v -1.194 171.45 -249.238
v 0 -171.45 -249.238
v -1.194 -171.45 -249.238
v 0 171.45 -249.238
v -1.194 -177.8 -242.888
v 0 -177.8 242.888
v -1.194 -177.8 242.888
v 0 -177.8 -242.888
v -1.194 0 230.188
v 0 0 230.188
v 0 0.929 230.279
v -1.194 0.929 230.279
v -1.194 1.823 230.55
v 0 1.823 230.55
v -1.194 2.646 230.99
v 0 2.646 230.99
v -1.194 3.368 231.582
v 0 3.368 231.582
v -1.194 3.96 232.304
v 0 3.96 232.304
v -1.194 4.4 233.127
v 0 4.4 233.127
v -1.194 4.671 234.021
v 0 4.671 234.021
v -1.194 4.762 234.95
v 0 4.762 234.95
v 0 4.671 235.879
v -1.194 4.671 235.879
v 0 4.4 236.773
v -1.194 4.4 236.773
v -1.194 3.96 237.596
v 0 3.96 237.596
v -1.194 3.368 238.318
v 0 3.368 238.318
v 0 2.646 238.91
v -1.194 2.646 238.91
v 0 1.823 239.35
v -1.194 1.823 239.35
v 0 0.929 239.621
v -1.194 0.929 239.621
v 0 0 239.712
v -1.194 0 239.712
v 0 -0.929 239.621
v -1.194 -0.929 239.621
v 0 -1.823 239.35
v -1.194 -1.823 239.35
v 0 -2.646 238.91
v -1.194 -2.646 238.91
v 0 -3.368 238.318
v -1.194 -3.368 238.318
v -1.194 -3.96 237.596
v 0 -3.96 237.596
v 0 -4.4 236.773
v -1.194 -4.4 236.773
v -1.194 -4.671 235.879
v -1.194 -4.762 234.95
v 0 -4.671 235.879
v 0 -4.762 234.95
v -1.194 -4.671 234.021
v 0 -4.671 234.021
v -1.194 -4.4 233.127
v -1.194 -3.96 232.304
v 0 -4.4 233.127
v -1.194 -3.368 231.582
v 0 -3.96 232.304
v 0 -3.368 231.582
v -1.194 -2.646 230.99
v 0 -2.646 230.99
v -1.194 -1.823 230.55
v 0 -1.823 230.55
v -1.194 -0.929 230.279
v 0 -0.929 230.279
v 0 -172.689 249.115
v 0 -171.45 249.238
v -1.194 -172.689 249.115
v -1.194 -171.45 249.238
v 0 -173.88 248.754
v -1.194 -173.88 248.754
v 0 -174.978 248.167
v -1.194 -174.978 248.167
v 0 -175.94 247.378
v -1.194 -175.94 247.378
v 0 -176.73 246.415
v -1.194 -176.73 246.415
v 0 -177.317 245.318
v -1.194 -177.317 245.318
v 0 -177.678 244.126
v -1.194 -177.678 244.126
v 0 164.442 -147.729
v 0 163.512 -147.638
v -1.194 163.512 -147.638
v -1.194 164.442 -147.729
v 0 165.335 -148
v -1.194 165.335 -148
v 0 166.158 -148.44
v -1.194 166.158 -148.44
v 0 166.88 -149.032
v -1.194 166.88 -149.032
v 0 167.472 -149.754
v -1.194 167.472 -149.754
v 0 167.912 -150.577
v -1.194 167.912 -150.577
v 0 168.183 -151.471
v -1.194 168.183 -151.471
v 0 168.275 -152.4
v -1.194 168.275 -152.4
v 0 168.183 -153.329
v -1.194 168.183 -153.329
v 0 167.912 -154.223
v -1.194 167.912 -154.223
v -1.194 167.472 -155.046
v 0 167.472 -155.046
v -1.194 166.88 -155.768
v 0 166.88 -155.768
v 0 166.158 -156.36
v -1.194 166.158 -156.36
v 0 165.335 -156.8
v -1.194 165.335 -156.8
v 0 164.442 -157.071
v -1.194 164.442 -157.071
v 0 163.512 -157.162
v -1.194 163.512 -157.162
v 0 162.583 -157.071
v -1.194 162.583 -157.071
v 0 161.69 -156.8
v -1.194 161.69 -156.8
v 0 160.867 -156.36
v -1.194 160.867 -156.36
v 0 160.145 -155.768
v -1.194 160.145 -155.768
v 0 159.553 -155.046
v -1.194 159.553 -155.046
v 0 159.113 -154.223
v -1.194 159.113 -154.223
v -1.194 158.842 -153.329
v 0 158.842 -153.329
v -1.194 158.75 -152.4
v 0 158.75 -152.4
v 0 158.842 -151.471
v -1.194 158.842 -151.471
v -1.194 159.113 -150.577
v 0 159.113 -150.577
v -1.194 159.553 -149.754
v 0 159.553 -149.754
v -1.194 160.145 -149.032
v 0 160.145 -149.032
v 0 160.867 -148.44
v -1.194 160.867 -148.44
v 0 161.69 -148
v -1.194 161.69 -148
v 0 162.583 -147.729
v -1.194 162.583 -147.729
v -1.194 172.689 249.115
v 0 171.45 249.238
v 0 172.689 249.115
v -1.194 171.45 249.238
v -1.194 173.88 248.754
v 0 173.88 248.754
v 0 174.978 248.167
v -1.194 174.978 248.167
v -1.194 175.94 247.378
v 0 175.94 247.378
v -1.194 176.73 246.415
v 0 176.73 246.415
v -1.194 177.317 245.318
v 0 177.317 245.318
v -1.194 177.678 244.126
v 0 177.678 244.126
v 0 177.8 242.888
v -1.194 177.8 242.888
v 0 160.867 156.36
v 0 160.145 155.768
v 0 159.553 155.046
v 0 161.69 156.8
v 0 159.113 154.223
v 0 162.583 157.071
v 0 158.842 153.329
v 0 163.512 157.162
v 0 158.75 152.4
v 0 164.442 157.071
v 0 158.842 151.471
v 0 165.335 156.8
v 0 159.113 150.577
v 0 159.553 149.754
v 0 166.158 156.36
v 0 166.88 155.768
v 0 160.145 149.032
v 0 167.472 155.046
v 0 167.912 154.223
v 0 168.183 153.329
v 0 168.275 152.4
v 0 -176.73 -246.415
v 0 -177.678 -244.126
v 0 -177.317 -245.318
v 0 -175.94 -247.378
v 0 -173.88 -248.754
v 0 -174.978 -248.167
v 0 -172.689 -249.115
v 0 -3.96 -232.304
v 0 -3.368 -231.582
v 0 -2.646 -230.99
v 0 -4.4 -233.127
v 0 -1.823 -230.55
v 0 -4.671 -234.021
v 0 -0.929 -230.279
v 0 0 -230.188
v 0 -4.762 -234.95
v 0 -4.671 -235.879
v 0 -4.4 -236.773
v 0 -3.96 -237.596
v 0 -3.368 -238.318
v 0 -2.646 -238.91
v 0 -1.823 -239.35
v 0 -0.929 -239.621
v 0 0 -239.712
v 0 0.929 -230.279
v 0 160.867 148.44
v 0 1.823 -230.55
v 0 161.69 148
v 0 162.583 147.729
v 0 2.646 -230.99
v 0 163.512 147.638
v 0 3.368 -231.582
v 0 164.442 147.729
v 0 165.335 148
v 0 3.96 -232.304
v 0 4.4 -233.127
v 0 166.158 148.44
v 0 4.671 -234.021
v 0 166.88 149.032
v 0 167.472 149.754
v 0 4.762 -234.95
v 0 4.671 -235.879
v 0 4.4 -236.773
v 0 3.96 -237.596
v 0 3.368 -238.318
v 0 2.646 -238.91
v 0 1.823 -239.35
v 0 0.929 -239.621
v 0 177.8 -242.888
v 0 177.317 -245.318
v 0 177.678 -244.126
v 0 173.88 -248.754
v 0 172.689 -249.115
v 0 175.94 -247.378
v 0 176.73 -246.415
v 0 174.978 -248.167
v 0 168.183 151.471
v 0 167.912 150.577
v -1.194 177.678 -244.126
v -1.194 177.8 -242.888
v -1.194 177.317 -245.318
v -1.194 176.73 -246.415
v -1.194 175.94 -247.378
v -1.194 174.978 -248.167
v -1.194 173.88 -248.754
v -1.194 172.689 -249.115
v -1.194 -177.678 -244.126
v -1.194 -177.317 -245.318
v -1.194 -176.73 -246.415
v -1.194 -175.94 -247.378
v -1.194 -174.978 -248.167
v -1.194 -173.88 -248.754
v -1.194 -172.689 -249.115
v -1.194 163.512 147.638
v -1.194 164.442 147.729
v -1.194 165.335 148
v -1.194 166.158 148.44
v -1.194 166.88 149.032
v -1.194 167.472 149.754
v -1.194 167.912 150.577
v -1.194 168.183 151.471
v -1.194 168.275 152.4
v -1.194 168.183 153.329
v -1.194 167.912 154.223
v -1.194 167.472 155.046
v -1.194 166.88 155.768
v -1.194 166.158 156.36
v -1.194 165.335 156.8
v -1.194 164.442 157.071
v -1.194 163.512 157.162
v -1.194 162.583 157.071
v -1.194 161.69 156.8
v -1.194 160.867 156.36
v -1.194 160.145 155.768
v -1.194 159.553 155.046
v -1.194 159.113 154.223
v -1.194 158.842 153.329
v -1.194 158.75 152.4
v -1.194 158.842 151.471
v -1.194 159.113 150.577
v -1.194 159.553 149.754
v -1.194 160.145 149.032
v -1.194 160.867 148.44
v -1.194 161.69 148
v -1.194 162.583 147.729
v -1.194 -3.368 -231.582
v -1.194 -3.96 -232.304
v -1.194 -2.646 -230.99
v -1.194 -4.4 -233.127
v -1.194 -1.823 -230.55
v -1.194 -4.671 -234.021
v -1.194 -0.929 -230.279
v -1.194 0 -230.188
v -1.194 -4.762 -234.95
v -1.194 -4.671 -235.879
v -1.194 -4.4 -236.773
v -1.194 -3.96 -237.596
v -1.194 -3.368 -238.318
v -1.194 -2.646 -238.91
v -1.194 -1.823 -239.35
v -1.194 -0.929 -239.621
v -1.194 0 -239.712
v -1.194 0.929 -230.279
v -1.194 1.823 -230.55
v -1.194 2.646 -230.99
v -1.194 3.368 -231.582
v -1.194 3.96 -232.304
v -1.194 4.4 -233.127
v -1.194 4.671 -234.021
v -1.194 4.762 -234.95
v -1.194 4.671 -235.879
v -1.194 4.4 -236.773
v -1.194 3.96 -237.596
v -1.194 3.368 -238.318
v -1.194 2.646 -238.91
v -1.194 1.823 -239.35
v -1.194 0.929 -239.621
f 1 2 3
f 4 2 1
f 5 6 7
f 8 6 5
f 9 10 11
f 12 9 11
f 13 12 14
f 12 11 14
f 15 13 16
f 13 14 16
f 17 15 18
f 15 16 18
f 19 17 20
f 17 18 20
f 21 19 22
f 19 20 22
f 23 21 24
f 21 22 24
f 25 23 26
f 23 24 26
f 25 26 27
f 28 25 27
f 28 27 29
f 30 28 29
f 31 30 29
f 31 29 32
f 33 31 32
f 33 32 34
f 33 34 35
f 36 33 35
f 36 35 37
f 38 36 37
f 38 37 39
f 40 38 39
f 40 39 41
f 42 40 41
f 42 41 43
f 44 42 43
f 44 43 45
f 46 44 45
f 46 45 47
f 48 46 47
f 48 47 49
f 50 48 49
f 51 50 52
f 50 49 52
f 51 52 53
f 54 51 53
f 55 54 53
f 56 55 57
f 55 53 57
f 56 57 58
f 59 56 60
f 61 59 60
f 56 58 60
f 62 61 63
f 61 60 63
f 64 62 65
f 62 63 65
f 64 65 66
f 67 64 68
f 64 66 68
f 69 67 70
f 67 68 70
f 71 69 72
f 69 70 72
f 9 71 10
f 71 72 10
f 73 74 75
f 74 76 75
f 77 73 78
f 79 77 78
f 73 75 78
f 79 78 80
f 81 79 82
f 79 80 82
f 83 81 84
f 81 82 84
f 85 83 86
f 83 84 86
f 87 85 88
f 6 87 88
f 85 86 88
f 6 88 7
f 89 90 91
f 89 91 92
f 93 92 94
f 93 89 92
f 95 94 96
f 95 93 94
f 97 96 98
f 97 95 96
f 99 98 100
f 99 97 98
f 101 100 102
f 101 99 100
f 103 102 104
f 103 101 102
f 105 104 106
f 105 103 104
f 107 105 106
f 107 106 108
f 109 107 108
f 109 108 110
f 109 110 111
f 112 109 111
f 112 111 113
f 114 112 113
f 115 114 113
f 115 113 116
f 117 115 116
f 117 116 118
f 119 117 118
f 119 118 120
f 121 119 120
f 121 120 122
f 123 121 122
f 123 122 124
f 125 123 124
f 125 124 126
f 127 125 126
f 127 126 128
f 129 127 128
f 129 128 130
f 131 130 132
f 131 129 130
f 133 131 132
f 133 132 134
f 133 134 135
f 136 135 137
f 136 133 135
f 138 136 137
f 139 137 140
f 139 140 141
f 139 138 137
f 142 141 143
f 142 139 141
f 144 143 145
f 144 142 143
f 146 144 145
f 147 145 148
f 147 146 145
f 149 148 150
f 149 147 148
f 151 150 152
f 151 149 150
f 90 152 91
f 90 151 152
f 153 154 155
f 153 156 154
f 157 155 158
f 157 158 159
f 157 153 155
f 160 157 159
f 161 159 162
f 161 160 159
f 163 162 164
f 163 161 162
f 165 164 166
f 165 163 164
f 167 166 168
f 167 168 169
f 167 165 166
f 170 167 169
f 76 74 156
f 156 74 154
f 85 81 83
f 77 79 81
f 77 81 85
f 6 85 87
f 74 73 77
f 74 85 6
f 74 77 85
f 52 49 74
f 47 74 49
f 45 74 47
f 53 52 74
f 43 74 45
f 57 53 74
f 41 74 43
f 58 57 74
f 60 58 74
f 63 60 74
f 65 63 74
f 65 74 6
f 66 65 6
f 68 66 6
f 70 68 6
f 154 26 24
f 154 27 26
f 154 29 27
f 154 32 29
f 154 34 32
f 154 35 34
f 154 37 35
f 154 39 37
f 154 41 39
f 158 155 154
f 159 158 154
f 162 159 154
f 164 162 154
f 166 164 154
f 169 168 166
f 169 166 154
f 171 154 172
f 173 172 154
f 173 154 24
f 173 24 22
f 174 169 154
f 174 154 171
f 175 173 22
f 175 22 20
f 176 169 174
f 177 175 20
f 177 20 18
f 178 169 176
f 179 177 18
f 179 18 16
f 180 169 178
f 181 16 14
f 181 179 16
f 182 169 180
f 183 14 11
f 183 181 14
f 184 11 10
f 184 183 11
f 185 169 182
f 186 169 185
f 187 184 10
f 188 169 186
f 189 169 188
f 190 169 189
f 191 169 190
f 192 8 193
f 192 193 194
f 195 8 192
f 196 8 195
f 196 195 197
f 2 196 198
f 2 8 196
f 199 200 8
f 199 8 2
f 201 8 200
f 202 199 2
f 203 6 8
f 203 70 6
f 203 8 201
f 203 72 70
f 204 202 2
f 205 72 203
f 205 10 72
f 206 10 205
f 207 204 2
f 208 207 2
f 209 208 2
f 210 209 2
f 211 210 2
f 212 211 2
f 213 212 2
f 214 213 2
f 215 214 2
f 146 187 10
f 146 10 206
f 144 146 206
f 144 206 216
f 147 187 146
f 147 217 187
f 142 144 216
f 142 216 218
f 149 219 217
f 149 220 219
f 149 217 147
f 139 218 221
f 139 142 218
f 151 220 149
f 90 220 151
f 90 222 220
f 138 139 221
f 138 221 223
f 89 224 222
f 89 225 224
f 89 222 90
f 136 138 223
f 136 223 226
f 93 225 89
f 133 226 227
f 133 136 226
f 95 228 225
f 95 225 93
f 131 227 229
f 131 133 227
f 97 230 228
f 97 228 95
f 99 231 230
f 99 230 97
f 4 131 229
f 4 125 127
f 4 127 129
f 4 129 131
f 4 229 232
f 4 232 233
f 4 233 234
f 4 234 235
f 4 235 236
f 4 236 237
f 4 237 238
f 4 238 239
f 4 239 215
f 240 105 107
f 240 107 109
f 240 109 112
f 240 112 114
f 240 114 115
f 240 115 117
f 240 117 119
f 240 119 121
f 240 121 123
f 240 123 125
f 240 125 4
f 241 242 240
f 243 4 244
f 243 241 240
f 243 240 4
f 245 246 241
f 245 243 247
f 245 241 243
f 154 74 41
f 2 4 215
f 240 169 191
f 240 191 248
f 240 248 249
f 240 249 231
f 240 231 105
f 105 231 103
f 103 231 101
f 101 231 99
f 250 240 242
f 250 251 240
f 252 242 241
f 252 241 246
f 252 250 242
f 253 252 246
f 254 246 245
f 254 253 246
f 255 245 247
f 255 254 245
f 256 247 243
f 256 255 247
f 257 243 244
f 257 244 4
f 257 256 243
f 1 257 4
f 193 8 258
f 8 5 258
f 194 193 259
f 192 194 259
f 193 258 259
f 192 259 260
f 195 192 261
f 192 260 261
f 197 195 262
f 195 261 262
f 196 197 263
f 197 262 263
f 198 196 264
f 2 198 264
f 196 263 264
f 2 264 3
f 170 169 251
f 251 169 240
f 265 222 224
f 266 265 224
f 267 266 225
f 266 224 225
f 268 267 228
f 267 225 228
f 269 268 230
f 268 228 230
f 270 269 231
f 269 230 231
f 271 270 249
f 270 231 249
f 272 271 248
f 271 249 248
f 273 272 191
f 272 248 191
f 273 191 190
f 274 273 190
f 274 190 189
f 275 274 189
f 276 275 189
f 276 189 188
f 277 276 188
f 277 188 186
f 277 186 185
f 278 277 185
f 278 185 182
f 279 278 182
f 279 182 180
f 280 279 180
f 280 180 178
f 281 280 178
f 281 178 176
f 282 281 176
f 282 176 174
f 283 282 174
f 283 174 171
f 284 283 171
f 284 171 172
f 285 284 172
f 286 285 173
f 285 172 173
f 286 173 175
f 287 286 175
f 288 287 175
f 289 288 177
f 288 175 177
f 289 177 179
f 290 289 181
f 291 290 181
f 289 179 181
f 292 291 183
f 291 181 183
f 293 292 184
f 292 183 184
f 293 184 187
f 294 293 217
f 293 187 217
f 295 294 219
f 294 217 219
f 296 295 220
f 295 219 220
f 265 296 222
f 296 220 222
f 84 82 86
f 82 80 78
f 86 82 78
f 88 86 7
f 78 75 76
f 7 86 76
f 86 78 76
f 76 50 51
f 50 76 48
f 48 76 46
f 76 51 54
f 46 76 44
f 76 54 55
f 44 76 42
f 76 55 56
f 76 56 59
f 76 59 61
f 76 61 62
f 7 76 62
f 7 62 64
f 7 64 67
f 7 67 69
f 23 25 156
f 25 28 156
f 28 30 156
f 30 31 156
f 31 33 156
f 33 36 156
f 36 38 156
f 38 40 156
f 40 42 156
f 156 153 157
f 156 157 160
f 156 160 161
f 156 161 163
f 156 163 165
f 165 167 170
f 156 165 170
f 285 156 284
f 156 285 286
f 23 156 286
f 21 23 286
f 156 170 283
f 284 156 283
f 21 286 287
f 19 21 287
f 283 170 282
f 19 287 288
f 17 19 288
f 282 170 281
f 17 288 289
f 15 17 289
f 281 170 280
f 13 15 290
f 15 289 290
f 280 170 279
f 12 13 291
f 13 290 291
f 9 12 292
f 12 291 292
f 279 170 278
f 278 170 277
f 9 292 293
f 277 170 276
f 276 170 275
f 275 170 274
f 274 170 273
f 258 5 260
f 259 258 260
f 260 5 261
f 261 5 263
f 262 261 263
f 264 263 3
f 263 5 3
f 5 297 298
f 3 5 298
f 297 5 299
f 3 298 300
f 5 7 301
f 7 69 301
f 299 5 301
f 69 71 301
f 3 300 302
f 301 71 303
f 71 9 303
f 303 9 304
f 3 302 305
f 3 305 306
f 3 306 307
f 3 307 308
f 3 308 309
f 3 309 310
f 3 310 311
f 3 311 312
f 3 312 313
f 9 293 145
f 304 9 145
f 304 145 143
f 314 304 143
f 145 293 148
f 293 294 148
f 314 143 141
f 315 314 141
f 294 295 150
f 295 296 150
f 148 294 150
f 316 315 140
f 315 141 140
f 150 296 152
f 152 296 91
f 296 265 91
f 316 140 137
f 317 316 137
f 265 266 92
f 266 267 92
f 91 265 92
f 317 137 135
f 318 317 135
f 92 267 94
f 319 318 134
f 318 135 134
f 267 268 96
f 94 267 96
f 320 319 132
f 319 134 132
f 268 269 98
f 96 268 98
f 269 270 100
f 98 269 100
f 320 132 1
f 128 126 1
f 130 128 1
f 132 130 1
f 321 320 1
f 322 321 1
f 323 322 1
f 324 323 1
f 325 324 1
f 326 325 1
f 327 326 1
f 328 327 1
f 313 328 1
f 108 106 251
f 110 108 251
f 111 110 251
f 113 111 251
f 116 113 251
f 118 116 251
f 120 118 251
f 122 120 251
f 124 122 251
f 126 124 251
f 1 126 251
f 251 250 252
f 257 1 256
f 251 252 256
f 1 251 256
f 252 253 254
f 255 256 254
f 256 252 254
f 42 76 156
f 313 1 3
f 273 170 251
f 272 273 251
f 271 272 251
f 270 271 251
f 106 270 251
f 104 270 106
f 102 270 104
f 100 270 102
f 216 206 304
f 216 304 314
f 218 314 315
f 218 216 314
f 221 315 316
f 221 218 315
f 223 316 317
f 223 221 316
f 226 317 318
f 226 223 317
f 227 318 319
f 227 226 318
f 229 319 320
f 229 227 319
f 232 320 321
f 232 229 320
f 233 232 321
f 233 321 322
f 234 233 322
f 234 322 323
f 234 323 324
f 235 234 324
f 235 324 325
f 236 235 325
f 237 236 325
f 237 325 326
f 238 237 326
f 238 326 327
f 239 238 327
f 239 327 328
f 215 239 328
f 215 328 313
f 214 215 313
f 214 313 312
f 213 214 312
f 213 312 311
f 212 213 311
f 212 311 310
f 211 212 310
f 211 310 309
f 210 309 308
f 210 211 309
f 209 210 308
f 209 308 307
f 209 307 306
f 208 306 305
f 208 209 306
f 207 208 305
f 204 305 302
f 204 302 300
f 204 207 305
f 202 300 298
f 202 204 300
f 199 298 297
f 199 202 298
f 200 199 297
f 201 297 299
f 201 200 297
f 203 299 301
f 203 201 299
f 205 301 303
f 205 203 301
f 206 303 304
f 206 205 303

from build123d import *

# Parameters (mm, degrees)
SKETCH1_W          = 498.475
SKETCH1_H          = 355.6
BASE_FLANGE1_DEPTH = 1.1938
CUT_EXTRUDE1_REACH = 308.159
SKETCH6_R          = 4.7625
FILLET1_R          = 6.35


# Sheet-metal steps are written as plain solids
with BuildPart() as part:
    # Sketch1 → Base-Flange1 (new body)
    with BuildSketch(Plane(origin=(0, 0, 0), x_dir=(0, 0, -1), z_dir=(1, 0, 0))):
        Rectangle(SKETCH1_W, SKETCH1_H)
    extrude(amount=-BASE_FLANGE1_DEPTH)

    # Sketch6 → Cut-Extrude1 (cut, up to next)
    with BuildSketch(Plane(origin=(0, 0, 0), x_dir=(0, 0, -1), z_dir=(1, 0, 0)), mode=Mode.PRIVATE) as cut_extrude1_sk1:
        with Locations((-152.4, 163.5125)):
            Circle(SKETCH6_R)
    cut_extrude1_tool1 = extrude(cut_extrude1_sk1.sketch, amount=-CUT_EXTRUDE1_REACH, mode=Mode.PRIVATE) & part.part
    # Sketch6 → Cut-Extrude1 (cut, up to next)
    with BuildSketch(Plane(origin=(0, 0, 0), x_dir=(0, 0, -1), z_dir=(1, 0, 0)), mode=Mode.PRIVATE) as cut_extrude1_sk2:
        with Locations((-234.95, 0)):
            Circle(SKETCH6_R)
    cut_extrude1_tool2 = extrude(cut_extrude1_sk2.sketch, amount=-CUT_EXTRUDE1_REACH, mode=Mode.PRIVATE) & part.part
    cut_extrude1_1 = cut_extrude1_tool1.solids().sort_by_distance((0, 163.5125, 152.4))[0]
    add(cut_extrude1_1, mode=Mode.SUBTRACT)
    cut_extrude1_2 = cut_extrude1_tool2.solids().sort_by_distance((0, 0, 234.95))[0]
    add(cut_extrude1_2, mode=Mode.SUBTRACT)
    cut_extrude1 = cut_extrude1_1 + cut_extrude1_2  # Cut-Extrude1 as one shape, for the pattern or mirror that repeats it

    # Mirror1: Cut-Extrude1 across plane
    add(cut_extrude1.mirror(Plane.XY), mode=Mode.SUBTRACT)

    # Fillet1
    fillet1_edges = [part.edges().sort_by_distance(p)[0] for p in [
        (-0.5969, 177.8, 249.2375),
        (-0.5969, 177.8, -249.2375),
        (-0.5969, -177.8, -249.2375),
        (-0.5969, -177.8, 249.2375),
    ]]
    fillet(fillet1_edges, radius=FILLET1_R)


solid = part.part
